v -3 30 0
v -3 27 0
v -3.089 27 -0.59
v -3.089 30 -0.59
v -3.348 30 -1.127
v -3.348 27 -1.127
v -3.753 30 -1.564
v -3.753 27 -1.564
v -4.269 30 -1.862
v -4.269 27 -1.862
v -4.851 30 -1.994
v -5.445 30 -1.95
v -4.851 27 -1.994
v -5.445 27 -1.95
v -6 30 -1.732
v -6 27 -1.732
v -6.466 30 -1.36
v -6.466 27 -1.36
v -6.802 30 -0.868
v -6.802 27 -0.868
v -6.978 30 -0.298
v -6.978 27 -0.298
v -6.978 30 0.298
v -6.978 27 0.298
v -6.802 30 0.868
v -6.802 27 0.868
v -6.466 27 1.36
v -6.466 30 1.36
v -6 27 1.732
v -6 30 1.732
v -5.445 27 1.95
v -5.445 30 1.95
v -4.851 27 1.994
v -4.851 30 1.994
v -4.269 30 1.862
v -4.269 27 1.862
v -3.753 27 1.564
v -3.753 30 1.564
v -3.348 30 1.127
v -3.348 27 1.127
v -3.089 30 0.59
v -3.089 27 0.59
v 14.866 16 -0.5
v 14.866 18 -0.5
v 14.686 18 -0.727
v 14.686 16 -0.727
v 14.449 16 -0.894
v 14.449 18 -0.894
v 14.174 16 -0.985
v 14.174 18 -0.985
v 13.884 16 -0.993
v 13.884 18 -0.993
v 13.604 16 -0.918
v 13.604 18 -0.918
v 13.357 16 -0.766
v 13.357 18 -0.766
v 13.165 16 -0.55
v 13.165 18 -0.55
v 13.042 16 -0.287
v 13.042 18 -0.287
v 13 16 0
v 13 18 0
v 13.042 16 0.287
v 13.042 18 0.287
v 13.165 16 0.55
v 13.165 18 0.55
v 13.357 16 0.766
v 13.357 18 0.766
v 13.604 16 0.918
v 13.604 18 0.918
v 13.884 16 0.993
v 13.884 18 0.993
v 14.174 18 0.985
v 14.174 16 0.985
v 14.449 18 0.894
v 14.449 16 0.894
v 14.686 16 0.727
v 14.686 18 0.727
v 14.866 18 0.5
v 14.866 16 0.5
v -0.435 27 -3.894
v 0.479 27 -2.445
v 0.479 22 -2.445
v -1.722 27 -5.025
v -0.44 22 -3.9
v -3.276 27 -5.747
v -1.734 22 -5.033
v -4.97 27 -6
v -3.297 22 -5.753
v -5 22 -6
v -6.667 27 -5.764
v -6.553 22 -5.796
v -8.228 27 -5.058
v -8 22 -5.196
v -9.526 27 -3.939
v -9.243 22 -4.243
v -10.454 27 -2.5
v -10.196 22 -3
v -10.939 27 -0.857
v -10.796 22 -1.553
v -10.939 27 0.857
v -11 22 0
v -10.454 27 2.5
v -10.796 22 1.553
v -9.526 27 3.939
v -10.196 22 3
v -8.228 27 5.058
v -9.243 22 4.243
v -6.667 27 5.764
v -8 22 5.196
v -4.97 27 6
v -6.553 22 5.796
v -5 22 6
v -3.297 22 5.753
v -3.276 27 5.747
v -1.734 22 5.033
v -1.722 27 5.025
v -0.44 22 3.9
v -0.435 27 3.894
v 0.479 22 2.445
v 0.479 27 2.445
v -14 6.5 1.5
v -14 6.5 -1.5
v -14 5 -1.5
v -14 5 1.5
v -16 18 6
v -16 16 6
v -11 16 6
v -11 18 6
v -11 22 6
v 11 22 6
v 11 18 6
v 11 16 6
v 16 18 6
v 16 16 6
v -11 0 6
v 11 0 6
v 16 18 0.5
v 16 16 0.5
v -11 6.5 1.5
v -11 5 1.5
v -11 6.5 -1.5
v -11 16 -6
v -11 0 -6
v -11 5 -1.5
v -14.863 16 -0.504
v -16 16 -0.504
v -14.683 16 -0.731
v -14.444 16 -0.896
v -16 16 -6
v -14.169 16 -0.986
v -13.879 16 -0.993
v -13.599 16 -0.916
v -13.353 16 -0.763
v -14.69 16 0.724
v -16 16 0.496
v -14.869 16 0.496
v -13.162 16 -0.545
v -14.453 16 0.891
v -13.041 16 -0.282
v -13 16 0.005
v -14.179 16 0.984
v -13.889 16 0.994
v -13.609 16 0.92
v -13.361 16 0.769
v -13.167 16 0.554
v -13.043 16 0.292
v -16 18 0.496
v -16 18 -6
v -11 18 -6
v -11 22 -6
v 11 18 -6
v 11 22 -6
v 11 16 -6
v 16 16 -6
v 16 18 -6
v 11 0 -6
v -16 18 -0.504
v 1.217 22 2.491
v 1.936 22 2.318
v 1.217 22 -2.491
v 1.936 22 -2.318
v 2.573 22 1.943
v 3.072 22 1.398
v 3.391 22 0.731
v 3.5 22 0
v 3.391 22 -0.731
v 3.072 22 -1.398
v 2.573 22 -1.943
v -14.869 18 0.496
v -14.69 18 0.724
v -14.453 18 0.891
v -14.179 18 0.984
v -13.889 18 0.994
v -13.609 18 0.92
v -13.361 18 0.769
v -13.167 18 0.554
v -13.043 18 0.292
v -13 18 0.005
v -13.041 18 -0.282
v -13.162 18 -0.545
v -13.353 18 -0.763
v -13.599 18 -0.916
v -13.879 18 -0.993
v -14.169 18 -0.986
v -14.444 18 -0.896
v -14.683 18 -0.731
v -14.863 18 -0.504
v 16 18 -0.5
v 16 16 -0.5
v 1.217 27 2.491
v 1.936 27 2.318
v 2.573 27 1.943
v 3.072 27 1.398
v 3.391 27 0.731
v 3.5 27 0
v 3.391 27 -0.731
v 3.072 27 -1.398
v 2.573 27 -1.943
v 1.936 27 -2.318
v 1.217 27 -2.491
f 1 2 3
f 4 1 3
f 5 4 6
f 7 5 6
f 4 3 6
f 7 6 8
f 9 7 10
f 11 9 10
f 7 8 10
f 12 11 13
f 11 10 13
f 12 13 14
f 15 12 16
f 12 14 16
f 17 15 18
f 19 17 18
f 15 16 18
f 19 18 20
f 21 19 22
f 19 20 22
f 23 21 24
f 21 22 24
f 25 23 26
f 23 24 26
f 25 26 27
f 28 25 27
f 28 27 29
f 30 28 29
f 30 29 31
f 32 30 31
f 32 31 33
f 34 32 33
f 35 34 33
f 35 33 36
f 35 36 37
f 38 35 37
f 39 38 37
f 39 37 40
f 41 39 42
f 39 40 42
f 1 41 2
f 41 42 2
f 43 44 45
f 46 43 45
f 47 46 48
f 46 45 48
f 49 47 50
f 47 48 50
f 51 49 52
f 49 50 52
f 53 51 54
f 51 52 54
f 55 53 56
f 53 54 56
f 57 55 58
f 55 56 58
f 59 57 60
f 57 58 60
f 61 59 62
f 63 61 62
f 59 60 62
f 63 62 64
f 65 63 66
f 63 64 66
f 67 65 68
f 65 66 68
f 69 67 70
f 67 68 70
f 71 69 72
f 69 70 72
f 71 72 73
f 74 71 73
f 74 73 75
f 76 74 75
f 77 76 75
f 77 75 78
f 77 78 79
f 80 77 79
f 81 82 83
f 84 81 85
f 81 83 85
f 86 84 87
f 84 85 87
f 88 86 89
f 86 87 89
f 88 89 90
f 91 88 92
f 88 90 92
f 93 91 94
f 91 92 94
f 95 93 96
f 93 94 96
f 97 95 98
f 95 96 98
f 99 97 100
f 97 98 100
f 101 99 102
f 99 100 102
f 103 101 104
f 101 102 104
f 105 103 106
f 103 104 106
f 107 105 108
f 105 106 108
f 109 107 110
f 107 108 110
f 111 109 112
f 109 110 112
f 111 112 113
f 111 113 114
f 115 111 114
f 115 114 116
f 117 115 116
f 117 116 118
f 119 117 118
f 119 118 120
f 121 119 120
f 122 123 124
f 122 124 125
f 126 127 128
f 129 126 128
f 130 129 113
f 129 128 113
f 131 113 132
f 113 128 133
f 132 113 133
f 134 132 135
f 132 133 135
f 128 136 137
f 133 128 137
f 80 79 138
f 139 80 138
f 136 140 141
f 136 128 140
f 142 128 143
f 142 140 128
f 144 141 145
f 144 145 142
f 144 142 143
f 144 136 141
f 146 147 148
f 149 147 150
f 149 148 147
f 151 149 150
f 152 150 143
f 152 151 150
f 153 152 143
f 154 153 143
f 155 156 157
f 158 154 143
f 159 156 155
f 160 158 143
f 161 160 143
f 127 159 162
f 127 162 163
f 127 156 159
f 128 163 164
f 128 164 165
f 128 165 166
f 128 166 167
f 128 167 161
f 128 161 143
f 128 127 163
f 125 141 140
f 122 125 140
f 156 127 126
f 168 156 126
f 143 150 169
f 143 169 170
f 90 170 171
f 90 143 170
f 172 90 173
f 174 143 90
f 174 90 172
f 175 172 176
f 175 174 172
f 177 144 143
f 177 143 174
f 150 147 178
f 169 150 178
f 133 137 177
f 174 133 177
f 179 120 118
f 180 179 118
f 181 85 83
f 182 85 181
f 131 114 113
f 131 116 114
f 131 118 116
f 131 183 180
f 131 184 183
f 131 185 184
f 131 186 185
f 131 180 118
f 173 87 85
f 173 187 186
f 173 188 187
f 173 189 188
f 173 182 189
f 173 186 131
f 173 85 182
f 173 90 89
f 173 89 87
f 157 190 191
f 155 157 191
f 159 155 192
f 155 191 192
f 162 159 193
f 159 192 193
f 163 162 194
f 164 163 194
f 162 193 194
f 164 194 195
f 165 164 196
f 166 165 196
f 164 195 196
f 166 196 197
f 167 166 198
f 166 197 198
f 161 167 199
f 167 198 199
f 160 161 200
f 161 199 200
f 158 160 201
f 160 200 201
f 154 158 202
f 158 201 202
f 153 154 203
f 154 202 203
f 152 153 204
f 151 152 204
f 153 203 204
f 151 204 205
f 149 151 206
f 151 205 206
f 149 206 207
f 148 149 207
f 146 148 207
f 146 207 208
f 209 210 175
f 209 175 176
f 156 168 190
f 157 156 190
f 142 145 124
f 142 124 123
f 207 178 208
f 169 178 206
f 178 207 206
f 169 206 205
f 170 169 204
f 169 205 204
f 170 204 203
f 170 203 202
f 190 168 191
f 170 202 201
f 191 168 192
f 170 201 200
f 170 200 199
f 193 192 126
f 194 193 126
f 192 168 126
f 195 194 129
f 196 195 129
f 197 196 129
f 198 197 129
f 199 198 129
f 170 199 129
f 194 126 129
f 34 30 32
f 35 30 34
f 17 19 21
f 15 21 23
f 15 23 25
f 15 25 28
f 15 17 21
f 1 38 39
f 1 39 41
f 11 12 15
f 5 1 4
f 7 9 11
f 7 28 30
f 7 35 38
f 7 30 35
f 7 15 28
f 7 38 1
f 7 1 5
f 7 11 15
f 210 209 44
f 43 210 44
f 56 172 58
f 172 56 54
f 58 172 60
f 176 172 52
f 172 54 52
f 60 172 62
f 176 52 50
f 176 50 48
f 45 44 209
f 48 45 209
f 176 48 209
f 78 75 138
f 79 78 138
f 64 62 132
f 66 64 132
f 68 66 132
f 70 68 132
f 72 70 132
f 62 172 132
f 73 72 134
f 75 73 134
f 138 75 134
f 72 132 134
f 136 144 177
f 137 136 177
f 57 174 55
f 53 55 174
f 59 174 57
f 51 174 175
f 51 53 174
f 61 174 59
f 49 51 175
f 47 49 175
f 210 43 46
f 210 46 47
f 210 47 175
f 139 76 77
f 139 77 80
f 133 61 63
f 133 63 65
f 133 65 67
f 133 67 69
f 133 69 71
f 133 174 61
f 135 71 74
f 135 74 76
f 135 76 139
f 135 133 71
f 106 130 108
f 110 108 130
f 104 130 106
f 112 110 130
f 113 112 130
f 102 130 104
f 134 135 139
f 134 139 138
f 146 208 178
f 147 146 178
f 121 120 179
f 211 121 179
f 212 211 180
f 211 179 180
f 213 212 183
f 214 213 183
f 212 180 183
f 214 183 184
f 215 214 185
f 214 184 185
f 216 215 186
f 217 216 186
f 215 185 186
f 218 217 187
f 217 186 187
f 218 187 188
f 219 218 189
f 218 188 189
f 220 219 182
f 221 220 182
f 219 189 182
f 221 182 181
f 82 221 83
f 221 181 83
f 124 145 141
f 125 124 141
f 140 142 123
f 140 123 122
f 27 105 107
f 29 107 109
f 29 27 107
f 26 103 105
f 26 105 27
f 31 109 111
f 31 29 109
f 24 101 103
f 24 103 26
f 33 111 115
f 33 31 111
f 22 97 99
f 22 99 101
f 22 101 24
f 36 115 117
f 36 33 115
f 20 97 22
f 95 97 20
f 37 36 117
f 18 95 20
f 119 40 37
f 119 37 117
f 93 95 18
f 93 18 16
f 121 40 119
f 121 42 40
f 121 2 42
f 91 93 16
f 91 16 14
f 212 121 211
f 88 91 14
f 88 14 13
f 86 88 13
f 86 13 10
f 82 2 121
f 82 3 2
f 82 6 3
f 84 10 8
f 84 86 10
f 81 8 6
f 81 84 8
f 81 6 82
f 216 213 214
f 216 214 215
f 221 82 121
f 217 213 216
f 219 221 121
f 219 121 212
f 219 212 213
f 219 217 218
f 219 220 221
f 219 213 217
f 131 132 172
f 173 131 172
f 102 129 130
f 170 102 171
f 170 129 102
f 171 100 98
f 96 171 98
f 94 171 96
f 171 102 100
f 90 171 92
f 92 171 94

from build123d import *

# Parameters (mm, degrees)
SKETCH_1_W          = 22
SKETCH_1_H          = 12
EXTRUDE_1_DEPTH     = 22
EXTRUDE_2_DEPTH     = 5
SKETCH_4_R          = 2
EXTRUDE_3_DEPTH     = 3
SKETCH_5_W          = 5
SKETCH_5_H          = 2
EXTRUDE_4_DEPTH     = 12
SKETCH_6_W          = 3
SKETCH_6_H          = 1.5
EXTRUDE_5_DEPTH     = 3
CUT_EXTRUDE_1_DEPTH = 3


with BuildPart() as part:
    # 草图1 → 凸台-拉伸1 (new body)
    with BuildSketch(Plane(origin=(0, 0, 0), x_dir=(1, 0, 0), z_dir=(0, 1, 0))):
        Rectangle(SKETCH_1_W, SKETCH_1_H)
    extrude(amount=EXTRUDE_1_DEPTH)

    # 草图3 → 凸台-拉伸2 (add)
    with BuildSketch(Plane(origin=(0, 22, 0), x_dir=(1, 0, 0), z_dir=(0, 1, 0))):
        with BuildLine():
            ThreePointArc((0.479166667, 2.445144707), (-11, 0), (0.479166667, -2.445144707))
            ThreePointArc((0.479166667, -2.445144707), (3.5, 0), (0.479166667, 2.445144707))
        make_face()
    extrude(amount=EXTRUDE_2_DEPTH)

    # 草图4 → 凸台-拉伸3 (add)
    with BuildSketch(Plane(origin=(0, 27, 0), x_dir=(1, 0, 0), z_dir=(0, 1, 0))):
        with Locations((-5, 0)):
            Circle(SKETCH_4_R)
    extrude(amount=EXTRUDE_3_DEPTH)

    # 草图5 → 凸台-拉伸4 (add)
    with BuildSketch(Plane.XY.offset(6)):
        with Locations((-13.5, 17)):
            Rectangle(SKETCH_5_W, SKETCH_5_H)
        with Locations((13.5, 17)):
            Rectangle(SKETCH_5_W, SKETCH_5_H)
    extrude(amount=-EXTRUDE_4_DEPTH)

    # 草图6 → 凸台-拉伸5 (add)
    with BuildSketch(Plane.ZY.offset(11)):
        with Locations((0, 5.75)):
            Rectangle(SKETCH_6_W, SKETCH_6_H)
    extrude(amount=EXTRUDE_5_DEPTH)

    # 草图7 → 切除-拉伸1 (cut)
    with BuildSketch(Plane(origin=(0, 18, 0), x_dir=(1, 0, 0), z_dir=(0, 1, 0))):
        with BuildLine():
            Line((-16, -0.495646194), (-14.868524525, -0.495646194))
            ThreePointArc((-14.868524525, -0.495646194), (-13.000012637, -0.005027364), (-14.863497098, 0.504353806))
            Line((-14.863497098, 0.504353806), (-16, 0.504353806))
            Line((-16, 0.504353806), (-16, -0.495646194))
        make_face()
        with BuildLine():
            Line((14.866025404, -0.5), (16, -0.5))
            Line((16, -0.5), (16, 0.5))
            Line((16, 0.5), (14.866025404, 0.5))
            ThreePointArc((14.866025404, 0.5), (13, 0), (14.866025404, -0.5))
        make_face()
    extrude(amount=-CUT_EXTRUDE_1_DEPTH, mode=Mode.SUBTRACT)


solid = part.part
